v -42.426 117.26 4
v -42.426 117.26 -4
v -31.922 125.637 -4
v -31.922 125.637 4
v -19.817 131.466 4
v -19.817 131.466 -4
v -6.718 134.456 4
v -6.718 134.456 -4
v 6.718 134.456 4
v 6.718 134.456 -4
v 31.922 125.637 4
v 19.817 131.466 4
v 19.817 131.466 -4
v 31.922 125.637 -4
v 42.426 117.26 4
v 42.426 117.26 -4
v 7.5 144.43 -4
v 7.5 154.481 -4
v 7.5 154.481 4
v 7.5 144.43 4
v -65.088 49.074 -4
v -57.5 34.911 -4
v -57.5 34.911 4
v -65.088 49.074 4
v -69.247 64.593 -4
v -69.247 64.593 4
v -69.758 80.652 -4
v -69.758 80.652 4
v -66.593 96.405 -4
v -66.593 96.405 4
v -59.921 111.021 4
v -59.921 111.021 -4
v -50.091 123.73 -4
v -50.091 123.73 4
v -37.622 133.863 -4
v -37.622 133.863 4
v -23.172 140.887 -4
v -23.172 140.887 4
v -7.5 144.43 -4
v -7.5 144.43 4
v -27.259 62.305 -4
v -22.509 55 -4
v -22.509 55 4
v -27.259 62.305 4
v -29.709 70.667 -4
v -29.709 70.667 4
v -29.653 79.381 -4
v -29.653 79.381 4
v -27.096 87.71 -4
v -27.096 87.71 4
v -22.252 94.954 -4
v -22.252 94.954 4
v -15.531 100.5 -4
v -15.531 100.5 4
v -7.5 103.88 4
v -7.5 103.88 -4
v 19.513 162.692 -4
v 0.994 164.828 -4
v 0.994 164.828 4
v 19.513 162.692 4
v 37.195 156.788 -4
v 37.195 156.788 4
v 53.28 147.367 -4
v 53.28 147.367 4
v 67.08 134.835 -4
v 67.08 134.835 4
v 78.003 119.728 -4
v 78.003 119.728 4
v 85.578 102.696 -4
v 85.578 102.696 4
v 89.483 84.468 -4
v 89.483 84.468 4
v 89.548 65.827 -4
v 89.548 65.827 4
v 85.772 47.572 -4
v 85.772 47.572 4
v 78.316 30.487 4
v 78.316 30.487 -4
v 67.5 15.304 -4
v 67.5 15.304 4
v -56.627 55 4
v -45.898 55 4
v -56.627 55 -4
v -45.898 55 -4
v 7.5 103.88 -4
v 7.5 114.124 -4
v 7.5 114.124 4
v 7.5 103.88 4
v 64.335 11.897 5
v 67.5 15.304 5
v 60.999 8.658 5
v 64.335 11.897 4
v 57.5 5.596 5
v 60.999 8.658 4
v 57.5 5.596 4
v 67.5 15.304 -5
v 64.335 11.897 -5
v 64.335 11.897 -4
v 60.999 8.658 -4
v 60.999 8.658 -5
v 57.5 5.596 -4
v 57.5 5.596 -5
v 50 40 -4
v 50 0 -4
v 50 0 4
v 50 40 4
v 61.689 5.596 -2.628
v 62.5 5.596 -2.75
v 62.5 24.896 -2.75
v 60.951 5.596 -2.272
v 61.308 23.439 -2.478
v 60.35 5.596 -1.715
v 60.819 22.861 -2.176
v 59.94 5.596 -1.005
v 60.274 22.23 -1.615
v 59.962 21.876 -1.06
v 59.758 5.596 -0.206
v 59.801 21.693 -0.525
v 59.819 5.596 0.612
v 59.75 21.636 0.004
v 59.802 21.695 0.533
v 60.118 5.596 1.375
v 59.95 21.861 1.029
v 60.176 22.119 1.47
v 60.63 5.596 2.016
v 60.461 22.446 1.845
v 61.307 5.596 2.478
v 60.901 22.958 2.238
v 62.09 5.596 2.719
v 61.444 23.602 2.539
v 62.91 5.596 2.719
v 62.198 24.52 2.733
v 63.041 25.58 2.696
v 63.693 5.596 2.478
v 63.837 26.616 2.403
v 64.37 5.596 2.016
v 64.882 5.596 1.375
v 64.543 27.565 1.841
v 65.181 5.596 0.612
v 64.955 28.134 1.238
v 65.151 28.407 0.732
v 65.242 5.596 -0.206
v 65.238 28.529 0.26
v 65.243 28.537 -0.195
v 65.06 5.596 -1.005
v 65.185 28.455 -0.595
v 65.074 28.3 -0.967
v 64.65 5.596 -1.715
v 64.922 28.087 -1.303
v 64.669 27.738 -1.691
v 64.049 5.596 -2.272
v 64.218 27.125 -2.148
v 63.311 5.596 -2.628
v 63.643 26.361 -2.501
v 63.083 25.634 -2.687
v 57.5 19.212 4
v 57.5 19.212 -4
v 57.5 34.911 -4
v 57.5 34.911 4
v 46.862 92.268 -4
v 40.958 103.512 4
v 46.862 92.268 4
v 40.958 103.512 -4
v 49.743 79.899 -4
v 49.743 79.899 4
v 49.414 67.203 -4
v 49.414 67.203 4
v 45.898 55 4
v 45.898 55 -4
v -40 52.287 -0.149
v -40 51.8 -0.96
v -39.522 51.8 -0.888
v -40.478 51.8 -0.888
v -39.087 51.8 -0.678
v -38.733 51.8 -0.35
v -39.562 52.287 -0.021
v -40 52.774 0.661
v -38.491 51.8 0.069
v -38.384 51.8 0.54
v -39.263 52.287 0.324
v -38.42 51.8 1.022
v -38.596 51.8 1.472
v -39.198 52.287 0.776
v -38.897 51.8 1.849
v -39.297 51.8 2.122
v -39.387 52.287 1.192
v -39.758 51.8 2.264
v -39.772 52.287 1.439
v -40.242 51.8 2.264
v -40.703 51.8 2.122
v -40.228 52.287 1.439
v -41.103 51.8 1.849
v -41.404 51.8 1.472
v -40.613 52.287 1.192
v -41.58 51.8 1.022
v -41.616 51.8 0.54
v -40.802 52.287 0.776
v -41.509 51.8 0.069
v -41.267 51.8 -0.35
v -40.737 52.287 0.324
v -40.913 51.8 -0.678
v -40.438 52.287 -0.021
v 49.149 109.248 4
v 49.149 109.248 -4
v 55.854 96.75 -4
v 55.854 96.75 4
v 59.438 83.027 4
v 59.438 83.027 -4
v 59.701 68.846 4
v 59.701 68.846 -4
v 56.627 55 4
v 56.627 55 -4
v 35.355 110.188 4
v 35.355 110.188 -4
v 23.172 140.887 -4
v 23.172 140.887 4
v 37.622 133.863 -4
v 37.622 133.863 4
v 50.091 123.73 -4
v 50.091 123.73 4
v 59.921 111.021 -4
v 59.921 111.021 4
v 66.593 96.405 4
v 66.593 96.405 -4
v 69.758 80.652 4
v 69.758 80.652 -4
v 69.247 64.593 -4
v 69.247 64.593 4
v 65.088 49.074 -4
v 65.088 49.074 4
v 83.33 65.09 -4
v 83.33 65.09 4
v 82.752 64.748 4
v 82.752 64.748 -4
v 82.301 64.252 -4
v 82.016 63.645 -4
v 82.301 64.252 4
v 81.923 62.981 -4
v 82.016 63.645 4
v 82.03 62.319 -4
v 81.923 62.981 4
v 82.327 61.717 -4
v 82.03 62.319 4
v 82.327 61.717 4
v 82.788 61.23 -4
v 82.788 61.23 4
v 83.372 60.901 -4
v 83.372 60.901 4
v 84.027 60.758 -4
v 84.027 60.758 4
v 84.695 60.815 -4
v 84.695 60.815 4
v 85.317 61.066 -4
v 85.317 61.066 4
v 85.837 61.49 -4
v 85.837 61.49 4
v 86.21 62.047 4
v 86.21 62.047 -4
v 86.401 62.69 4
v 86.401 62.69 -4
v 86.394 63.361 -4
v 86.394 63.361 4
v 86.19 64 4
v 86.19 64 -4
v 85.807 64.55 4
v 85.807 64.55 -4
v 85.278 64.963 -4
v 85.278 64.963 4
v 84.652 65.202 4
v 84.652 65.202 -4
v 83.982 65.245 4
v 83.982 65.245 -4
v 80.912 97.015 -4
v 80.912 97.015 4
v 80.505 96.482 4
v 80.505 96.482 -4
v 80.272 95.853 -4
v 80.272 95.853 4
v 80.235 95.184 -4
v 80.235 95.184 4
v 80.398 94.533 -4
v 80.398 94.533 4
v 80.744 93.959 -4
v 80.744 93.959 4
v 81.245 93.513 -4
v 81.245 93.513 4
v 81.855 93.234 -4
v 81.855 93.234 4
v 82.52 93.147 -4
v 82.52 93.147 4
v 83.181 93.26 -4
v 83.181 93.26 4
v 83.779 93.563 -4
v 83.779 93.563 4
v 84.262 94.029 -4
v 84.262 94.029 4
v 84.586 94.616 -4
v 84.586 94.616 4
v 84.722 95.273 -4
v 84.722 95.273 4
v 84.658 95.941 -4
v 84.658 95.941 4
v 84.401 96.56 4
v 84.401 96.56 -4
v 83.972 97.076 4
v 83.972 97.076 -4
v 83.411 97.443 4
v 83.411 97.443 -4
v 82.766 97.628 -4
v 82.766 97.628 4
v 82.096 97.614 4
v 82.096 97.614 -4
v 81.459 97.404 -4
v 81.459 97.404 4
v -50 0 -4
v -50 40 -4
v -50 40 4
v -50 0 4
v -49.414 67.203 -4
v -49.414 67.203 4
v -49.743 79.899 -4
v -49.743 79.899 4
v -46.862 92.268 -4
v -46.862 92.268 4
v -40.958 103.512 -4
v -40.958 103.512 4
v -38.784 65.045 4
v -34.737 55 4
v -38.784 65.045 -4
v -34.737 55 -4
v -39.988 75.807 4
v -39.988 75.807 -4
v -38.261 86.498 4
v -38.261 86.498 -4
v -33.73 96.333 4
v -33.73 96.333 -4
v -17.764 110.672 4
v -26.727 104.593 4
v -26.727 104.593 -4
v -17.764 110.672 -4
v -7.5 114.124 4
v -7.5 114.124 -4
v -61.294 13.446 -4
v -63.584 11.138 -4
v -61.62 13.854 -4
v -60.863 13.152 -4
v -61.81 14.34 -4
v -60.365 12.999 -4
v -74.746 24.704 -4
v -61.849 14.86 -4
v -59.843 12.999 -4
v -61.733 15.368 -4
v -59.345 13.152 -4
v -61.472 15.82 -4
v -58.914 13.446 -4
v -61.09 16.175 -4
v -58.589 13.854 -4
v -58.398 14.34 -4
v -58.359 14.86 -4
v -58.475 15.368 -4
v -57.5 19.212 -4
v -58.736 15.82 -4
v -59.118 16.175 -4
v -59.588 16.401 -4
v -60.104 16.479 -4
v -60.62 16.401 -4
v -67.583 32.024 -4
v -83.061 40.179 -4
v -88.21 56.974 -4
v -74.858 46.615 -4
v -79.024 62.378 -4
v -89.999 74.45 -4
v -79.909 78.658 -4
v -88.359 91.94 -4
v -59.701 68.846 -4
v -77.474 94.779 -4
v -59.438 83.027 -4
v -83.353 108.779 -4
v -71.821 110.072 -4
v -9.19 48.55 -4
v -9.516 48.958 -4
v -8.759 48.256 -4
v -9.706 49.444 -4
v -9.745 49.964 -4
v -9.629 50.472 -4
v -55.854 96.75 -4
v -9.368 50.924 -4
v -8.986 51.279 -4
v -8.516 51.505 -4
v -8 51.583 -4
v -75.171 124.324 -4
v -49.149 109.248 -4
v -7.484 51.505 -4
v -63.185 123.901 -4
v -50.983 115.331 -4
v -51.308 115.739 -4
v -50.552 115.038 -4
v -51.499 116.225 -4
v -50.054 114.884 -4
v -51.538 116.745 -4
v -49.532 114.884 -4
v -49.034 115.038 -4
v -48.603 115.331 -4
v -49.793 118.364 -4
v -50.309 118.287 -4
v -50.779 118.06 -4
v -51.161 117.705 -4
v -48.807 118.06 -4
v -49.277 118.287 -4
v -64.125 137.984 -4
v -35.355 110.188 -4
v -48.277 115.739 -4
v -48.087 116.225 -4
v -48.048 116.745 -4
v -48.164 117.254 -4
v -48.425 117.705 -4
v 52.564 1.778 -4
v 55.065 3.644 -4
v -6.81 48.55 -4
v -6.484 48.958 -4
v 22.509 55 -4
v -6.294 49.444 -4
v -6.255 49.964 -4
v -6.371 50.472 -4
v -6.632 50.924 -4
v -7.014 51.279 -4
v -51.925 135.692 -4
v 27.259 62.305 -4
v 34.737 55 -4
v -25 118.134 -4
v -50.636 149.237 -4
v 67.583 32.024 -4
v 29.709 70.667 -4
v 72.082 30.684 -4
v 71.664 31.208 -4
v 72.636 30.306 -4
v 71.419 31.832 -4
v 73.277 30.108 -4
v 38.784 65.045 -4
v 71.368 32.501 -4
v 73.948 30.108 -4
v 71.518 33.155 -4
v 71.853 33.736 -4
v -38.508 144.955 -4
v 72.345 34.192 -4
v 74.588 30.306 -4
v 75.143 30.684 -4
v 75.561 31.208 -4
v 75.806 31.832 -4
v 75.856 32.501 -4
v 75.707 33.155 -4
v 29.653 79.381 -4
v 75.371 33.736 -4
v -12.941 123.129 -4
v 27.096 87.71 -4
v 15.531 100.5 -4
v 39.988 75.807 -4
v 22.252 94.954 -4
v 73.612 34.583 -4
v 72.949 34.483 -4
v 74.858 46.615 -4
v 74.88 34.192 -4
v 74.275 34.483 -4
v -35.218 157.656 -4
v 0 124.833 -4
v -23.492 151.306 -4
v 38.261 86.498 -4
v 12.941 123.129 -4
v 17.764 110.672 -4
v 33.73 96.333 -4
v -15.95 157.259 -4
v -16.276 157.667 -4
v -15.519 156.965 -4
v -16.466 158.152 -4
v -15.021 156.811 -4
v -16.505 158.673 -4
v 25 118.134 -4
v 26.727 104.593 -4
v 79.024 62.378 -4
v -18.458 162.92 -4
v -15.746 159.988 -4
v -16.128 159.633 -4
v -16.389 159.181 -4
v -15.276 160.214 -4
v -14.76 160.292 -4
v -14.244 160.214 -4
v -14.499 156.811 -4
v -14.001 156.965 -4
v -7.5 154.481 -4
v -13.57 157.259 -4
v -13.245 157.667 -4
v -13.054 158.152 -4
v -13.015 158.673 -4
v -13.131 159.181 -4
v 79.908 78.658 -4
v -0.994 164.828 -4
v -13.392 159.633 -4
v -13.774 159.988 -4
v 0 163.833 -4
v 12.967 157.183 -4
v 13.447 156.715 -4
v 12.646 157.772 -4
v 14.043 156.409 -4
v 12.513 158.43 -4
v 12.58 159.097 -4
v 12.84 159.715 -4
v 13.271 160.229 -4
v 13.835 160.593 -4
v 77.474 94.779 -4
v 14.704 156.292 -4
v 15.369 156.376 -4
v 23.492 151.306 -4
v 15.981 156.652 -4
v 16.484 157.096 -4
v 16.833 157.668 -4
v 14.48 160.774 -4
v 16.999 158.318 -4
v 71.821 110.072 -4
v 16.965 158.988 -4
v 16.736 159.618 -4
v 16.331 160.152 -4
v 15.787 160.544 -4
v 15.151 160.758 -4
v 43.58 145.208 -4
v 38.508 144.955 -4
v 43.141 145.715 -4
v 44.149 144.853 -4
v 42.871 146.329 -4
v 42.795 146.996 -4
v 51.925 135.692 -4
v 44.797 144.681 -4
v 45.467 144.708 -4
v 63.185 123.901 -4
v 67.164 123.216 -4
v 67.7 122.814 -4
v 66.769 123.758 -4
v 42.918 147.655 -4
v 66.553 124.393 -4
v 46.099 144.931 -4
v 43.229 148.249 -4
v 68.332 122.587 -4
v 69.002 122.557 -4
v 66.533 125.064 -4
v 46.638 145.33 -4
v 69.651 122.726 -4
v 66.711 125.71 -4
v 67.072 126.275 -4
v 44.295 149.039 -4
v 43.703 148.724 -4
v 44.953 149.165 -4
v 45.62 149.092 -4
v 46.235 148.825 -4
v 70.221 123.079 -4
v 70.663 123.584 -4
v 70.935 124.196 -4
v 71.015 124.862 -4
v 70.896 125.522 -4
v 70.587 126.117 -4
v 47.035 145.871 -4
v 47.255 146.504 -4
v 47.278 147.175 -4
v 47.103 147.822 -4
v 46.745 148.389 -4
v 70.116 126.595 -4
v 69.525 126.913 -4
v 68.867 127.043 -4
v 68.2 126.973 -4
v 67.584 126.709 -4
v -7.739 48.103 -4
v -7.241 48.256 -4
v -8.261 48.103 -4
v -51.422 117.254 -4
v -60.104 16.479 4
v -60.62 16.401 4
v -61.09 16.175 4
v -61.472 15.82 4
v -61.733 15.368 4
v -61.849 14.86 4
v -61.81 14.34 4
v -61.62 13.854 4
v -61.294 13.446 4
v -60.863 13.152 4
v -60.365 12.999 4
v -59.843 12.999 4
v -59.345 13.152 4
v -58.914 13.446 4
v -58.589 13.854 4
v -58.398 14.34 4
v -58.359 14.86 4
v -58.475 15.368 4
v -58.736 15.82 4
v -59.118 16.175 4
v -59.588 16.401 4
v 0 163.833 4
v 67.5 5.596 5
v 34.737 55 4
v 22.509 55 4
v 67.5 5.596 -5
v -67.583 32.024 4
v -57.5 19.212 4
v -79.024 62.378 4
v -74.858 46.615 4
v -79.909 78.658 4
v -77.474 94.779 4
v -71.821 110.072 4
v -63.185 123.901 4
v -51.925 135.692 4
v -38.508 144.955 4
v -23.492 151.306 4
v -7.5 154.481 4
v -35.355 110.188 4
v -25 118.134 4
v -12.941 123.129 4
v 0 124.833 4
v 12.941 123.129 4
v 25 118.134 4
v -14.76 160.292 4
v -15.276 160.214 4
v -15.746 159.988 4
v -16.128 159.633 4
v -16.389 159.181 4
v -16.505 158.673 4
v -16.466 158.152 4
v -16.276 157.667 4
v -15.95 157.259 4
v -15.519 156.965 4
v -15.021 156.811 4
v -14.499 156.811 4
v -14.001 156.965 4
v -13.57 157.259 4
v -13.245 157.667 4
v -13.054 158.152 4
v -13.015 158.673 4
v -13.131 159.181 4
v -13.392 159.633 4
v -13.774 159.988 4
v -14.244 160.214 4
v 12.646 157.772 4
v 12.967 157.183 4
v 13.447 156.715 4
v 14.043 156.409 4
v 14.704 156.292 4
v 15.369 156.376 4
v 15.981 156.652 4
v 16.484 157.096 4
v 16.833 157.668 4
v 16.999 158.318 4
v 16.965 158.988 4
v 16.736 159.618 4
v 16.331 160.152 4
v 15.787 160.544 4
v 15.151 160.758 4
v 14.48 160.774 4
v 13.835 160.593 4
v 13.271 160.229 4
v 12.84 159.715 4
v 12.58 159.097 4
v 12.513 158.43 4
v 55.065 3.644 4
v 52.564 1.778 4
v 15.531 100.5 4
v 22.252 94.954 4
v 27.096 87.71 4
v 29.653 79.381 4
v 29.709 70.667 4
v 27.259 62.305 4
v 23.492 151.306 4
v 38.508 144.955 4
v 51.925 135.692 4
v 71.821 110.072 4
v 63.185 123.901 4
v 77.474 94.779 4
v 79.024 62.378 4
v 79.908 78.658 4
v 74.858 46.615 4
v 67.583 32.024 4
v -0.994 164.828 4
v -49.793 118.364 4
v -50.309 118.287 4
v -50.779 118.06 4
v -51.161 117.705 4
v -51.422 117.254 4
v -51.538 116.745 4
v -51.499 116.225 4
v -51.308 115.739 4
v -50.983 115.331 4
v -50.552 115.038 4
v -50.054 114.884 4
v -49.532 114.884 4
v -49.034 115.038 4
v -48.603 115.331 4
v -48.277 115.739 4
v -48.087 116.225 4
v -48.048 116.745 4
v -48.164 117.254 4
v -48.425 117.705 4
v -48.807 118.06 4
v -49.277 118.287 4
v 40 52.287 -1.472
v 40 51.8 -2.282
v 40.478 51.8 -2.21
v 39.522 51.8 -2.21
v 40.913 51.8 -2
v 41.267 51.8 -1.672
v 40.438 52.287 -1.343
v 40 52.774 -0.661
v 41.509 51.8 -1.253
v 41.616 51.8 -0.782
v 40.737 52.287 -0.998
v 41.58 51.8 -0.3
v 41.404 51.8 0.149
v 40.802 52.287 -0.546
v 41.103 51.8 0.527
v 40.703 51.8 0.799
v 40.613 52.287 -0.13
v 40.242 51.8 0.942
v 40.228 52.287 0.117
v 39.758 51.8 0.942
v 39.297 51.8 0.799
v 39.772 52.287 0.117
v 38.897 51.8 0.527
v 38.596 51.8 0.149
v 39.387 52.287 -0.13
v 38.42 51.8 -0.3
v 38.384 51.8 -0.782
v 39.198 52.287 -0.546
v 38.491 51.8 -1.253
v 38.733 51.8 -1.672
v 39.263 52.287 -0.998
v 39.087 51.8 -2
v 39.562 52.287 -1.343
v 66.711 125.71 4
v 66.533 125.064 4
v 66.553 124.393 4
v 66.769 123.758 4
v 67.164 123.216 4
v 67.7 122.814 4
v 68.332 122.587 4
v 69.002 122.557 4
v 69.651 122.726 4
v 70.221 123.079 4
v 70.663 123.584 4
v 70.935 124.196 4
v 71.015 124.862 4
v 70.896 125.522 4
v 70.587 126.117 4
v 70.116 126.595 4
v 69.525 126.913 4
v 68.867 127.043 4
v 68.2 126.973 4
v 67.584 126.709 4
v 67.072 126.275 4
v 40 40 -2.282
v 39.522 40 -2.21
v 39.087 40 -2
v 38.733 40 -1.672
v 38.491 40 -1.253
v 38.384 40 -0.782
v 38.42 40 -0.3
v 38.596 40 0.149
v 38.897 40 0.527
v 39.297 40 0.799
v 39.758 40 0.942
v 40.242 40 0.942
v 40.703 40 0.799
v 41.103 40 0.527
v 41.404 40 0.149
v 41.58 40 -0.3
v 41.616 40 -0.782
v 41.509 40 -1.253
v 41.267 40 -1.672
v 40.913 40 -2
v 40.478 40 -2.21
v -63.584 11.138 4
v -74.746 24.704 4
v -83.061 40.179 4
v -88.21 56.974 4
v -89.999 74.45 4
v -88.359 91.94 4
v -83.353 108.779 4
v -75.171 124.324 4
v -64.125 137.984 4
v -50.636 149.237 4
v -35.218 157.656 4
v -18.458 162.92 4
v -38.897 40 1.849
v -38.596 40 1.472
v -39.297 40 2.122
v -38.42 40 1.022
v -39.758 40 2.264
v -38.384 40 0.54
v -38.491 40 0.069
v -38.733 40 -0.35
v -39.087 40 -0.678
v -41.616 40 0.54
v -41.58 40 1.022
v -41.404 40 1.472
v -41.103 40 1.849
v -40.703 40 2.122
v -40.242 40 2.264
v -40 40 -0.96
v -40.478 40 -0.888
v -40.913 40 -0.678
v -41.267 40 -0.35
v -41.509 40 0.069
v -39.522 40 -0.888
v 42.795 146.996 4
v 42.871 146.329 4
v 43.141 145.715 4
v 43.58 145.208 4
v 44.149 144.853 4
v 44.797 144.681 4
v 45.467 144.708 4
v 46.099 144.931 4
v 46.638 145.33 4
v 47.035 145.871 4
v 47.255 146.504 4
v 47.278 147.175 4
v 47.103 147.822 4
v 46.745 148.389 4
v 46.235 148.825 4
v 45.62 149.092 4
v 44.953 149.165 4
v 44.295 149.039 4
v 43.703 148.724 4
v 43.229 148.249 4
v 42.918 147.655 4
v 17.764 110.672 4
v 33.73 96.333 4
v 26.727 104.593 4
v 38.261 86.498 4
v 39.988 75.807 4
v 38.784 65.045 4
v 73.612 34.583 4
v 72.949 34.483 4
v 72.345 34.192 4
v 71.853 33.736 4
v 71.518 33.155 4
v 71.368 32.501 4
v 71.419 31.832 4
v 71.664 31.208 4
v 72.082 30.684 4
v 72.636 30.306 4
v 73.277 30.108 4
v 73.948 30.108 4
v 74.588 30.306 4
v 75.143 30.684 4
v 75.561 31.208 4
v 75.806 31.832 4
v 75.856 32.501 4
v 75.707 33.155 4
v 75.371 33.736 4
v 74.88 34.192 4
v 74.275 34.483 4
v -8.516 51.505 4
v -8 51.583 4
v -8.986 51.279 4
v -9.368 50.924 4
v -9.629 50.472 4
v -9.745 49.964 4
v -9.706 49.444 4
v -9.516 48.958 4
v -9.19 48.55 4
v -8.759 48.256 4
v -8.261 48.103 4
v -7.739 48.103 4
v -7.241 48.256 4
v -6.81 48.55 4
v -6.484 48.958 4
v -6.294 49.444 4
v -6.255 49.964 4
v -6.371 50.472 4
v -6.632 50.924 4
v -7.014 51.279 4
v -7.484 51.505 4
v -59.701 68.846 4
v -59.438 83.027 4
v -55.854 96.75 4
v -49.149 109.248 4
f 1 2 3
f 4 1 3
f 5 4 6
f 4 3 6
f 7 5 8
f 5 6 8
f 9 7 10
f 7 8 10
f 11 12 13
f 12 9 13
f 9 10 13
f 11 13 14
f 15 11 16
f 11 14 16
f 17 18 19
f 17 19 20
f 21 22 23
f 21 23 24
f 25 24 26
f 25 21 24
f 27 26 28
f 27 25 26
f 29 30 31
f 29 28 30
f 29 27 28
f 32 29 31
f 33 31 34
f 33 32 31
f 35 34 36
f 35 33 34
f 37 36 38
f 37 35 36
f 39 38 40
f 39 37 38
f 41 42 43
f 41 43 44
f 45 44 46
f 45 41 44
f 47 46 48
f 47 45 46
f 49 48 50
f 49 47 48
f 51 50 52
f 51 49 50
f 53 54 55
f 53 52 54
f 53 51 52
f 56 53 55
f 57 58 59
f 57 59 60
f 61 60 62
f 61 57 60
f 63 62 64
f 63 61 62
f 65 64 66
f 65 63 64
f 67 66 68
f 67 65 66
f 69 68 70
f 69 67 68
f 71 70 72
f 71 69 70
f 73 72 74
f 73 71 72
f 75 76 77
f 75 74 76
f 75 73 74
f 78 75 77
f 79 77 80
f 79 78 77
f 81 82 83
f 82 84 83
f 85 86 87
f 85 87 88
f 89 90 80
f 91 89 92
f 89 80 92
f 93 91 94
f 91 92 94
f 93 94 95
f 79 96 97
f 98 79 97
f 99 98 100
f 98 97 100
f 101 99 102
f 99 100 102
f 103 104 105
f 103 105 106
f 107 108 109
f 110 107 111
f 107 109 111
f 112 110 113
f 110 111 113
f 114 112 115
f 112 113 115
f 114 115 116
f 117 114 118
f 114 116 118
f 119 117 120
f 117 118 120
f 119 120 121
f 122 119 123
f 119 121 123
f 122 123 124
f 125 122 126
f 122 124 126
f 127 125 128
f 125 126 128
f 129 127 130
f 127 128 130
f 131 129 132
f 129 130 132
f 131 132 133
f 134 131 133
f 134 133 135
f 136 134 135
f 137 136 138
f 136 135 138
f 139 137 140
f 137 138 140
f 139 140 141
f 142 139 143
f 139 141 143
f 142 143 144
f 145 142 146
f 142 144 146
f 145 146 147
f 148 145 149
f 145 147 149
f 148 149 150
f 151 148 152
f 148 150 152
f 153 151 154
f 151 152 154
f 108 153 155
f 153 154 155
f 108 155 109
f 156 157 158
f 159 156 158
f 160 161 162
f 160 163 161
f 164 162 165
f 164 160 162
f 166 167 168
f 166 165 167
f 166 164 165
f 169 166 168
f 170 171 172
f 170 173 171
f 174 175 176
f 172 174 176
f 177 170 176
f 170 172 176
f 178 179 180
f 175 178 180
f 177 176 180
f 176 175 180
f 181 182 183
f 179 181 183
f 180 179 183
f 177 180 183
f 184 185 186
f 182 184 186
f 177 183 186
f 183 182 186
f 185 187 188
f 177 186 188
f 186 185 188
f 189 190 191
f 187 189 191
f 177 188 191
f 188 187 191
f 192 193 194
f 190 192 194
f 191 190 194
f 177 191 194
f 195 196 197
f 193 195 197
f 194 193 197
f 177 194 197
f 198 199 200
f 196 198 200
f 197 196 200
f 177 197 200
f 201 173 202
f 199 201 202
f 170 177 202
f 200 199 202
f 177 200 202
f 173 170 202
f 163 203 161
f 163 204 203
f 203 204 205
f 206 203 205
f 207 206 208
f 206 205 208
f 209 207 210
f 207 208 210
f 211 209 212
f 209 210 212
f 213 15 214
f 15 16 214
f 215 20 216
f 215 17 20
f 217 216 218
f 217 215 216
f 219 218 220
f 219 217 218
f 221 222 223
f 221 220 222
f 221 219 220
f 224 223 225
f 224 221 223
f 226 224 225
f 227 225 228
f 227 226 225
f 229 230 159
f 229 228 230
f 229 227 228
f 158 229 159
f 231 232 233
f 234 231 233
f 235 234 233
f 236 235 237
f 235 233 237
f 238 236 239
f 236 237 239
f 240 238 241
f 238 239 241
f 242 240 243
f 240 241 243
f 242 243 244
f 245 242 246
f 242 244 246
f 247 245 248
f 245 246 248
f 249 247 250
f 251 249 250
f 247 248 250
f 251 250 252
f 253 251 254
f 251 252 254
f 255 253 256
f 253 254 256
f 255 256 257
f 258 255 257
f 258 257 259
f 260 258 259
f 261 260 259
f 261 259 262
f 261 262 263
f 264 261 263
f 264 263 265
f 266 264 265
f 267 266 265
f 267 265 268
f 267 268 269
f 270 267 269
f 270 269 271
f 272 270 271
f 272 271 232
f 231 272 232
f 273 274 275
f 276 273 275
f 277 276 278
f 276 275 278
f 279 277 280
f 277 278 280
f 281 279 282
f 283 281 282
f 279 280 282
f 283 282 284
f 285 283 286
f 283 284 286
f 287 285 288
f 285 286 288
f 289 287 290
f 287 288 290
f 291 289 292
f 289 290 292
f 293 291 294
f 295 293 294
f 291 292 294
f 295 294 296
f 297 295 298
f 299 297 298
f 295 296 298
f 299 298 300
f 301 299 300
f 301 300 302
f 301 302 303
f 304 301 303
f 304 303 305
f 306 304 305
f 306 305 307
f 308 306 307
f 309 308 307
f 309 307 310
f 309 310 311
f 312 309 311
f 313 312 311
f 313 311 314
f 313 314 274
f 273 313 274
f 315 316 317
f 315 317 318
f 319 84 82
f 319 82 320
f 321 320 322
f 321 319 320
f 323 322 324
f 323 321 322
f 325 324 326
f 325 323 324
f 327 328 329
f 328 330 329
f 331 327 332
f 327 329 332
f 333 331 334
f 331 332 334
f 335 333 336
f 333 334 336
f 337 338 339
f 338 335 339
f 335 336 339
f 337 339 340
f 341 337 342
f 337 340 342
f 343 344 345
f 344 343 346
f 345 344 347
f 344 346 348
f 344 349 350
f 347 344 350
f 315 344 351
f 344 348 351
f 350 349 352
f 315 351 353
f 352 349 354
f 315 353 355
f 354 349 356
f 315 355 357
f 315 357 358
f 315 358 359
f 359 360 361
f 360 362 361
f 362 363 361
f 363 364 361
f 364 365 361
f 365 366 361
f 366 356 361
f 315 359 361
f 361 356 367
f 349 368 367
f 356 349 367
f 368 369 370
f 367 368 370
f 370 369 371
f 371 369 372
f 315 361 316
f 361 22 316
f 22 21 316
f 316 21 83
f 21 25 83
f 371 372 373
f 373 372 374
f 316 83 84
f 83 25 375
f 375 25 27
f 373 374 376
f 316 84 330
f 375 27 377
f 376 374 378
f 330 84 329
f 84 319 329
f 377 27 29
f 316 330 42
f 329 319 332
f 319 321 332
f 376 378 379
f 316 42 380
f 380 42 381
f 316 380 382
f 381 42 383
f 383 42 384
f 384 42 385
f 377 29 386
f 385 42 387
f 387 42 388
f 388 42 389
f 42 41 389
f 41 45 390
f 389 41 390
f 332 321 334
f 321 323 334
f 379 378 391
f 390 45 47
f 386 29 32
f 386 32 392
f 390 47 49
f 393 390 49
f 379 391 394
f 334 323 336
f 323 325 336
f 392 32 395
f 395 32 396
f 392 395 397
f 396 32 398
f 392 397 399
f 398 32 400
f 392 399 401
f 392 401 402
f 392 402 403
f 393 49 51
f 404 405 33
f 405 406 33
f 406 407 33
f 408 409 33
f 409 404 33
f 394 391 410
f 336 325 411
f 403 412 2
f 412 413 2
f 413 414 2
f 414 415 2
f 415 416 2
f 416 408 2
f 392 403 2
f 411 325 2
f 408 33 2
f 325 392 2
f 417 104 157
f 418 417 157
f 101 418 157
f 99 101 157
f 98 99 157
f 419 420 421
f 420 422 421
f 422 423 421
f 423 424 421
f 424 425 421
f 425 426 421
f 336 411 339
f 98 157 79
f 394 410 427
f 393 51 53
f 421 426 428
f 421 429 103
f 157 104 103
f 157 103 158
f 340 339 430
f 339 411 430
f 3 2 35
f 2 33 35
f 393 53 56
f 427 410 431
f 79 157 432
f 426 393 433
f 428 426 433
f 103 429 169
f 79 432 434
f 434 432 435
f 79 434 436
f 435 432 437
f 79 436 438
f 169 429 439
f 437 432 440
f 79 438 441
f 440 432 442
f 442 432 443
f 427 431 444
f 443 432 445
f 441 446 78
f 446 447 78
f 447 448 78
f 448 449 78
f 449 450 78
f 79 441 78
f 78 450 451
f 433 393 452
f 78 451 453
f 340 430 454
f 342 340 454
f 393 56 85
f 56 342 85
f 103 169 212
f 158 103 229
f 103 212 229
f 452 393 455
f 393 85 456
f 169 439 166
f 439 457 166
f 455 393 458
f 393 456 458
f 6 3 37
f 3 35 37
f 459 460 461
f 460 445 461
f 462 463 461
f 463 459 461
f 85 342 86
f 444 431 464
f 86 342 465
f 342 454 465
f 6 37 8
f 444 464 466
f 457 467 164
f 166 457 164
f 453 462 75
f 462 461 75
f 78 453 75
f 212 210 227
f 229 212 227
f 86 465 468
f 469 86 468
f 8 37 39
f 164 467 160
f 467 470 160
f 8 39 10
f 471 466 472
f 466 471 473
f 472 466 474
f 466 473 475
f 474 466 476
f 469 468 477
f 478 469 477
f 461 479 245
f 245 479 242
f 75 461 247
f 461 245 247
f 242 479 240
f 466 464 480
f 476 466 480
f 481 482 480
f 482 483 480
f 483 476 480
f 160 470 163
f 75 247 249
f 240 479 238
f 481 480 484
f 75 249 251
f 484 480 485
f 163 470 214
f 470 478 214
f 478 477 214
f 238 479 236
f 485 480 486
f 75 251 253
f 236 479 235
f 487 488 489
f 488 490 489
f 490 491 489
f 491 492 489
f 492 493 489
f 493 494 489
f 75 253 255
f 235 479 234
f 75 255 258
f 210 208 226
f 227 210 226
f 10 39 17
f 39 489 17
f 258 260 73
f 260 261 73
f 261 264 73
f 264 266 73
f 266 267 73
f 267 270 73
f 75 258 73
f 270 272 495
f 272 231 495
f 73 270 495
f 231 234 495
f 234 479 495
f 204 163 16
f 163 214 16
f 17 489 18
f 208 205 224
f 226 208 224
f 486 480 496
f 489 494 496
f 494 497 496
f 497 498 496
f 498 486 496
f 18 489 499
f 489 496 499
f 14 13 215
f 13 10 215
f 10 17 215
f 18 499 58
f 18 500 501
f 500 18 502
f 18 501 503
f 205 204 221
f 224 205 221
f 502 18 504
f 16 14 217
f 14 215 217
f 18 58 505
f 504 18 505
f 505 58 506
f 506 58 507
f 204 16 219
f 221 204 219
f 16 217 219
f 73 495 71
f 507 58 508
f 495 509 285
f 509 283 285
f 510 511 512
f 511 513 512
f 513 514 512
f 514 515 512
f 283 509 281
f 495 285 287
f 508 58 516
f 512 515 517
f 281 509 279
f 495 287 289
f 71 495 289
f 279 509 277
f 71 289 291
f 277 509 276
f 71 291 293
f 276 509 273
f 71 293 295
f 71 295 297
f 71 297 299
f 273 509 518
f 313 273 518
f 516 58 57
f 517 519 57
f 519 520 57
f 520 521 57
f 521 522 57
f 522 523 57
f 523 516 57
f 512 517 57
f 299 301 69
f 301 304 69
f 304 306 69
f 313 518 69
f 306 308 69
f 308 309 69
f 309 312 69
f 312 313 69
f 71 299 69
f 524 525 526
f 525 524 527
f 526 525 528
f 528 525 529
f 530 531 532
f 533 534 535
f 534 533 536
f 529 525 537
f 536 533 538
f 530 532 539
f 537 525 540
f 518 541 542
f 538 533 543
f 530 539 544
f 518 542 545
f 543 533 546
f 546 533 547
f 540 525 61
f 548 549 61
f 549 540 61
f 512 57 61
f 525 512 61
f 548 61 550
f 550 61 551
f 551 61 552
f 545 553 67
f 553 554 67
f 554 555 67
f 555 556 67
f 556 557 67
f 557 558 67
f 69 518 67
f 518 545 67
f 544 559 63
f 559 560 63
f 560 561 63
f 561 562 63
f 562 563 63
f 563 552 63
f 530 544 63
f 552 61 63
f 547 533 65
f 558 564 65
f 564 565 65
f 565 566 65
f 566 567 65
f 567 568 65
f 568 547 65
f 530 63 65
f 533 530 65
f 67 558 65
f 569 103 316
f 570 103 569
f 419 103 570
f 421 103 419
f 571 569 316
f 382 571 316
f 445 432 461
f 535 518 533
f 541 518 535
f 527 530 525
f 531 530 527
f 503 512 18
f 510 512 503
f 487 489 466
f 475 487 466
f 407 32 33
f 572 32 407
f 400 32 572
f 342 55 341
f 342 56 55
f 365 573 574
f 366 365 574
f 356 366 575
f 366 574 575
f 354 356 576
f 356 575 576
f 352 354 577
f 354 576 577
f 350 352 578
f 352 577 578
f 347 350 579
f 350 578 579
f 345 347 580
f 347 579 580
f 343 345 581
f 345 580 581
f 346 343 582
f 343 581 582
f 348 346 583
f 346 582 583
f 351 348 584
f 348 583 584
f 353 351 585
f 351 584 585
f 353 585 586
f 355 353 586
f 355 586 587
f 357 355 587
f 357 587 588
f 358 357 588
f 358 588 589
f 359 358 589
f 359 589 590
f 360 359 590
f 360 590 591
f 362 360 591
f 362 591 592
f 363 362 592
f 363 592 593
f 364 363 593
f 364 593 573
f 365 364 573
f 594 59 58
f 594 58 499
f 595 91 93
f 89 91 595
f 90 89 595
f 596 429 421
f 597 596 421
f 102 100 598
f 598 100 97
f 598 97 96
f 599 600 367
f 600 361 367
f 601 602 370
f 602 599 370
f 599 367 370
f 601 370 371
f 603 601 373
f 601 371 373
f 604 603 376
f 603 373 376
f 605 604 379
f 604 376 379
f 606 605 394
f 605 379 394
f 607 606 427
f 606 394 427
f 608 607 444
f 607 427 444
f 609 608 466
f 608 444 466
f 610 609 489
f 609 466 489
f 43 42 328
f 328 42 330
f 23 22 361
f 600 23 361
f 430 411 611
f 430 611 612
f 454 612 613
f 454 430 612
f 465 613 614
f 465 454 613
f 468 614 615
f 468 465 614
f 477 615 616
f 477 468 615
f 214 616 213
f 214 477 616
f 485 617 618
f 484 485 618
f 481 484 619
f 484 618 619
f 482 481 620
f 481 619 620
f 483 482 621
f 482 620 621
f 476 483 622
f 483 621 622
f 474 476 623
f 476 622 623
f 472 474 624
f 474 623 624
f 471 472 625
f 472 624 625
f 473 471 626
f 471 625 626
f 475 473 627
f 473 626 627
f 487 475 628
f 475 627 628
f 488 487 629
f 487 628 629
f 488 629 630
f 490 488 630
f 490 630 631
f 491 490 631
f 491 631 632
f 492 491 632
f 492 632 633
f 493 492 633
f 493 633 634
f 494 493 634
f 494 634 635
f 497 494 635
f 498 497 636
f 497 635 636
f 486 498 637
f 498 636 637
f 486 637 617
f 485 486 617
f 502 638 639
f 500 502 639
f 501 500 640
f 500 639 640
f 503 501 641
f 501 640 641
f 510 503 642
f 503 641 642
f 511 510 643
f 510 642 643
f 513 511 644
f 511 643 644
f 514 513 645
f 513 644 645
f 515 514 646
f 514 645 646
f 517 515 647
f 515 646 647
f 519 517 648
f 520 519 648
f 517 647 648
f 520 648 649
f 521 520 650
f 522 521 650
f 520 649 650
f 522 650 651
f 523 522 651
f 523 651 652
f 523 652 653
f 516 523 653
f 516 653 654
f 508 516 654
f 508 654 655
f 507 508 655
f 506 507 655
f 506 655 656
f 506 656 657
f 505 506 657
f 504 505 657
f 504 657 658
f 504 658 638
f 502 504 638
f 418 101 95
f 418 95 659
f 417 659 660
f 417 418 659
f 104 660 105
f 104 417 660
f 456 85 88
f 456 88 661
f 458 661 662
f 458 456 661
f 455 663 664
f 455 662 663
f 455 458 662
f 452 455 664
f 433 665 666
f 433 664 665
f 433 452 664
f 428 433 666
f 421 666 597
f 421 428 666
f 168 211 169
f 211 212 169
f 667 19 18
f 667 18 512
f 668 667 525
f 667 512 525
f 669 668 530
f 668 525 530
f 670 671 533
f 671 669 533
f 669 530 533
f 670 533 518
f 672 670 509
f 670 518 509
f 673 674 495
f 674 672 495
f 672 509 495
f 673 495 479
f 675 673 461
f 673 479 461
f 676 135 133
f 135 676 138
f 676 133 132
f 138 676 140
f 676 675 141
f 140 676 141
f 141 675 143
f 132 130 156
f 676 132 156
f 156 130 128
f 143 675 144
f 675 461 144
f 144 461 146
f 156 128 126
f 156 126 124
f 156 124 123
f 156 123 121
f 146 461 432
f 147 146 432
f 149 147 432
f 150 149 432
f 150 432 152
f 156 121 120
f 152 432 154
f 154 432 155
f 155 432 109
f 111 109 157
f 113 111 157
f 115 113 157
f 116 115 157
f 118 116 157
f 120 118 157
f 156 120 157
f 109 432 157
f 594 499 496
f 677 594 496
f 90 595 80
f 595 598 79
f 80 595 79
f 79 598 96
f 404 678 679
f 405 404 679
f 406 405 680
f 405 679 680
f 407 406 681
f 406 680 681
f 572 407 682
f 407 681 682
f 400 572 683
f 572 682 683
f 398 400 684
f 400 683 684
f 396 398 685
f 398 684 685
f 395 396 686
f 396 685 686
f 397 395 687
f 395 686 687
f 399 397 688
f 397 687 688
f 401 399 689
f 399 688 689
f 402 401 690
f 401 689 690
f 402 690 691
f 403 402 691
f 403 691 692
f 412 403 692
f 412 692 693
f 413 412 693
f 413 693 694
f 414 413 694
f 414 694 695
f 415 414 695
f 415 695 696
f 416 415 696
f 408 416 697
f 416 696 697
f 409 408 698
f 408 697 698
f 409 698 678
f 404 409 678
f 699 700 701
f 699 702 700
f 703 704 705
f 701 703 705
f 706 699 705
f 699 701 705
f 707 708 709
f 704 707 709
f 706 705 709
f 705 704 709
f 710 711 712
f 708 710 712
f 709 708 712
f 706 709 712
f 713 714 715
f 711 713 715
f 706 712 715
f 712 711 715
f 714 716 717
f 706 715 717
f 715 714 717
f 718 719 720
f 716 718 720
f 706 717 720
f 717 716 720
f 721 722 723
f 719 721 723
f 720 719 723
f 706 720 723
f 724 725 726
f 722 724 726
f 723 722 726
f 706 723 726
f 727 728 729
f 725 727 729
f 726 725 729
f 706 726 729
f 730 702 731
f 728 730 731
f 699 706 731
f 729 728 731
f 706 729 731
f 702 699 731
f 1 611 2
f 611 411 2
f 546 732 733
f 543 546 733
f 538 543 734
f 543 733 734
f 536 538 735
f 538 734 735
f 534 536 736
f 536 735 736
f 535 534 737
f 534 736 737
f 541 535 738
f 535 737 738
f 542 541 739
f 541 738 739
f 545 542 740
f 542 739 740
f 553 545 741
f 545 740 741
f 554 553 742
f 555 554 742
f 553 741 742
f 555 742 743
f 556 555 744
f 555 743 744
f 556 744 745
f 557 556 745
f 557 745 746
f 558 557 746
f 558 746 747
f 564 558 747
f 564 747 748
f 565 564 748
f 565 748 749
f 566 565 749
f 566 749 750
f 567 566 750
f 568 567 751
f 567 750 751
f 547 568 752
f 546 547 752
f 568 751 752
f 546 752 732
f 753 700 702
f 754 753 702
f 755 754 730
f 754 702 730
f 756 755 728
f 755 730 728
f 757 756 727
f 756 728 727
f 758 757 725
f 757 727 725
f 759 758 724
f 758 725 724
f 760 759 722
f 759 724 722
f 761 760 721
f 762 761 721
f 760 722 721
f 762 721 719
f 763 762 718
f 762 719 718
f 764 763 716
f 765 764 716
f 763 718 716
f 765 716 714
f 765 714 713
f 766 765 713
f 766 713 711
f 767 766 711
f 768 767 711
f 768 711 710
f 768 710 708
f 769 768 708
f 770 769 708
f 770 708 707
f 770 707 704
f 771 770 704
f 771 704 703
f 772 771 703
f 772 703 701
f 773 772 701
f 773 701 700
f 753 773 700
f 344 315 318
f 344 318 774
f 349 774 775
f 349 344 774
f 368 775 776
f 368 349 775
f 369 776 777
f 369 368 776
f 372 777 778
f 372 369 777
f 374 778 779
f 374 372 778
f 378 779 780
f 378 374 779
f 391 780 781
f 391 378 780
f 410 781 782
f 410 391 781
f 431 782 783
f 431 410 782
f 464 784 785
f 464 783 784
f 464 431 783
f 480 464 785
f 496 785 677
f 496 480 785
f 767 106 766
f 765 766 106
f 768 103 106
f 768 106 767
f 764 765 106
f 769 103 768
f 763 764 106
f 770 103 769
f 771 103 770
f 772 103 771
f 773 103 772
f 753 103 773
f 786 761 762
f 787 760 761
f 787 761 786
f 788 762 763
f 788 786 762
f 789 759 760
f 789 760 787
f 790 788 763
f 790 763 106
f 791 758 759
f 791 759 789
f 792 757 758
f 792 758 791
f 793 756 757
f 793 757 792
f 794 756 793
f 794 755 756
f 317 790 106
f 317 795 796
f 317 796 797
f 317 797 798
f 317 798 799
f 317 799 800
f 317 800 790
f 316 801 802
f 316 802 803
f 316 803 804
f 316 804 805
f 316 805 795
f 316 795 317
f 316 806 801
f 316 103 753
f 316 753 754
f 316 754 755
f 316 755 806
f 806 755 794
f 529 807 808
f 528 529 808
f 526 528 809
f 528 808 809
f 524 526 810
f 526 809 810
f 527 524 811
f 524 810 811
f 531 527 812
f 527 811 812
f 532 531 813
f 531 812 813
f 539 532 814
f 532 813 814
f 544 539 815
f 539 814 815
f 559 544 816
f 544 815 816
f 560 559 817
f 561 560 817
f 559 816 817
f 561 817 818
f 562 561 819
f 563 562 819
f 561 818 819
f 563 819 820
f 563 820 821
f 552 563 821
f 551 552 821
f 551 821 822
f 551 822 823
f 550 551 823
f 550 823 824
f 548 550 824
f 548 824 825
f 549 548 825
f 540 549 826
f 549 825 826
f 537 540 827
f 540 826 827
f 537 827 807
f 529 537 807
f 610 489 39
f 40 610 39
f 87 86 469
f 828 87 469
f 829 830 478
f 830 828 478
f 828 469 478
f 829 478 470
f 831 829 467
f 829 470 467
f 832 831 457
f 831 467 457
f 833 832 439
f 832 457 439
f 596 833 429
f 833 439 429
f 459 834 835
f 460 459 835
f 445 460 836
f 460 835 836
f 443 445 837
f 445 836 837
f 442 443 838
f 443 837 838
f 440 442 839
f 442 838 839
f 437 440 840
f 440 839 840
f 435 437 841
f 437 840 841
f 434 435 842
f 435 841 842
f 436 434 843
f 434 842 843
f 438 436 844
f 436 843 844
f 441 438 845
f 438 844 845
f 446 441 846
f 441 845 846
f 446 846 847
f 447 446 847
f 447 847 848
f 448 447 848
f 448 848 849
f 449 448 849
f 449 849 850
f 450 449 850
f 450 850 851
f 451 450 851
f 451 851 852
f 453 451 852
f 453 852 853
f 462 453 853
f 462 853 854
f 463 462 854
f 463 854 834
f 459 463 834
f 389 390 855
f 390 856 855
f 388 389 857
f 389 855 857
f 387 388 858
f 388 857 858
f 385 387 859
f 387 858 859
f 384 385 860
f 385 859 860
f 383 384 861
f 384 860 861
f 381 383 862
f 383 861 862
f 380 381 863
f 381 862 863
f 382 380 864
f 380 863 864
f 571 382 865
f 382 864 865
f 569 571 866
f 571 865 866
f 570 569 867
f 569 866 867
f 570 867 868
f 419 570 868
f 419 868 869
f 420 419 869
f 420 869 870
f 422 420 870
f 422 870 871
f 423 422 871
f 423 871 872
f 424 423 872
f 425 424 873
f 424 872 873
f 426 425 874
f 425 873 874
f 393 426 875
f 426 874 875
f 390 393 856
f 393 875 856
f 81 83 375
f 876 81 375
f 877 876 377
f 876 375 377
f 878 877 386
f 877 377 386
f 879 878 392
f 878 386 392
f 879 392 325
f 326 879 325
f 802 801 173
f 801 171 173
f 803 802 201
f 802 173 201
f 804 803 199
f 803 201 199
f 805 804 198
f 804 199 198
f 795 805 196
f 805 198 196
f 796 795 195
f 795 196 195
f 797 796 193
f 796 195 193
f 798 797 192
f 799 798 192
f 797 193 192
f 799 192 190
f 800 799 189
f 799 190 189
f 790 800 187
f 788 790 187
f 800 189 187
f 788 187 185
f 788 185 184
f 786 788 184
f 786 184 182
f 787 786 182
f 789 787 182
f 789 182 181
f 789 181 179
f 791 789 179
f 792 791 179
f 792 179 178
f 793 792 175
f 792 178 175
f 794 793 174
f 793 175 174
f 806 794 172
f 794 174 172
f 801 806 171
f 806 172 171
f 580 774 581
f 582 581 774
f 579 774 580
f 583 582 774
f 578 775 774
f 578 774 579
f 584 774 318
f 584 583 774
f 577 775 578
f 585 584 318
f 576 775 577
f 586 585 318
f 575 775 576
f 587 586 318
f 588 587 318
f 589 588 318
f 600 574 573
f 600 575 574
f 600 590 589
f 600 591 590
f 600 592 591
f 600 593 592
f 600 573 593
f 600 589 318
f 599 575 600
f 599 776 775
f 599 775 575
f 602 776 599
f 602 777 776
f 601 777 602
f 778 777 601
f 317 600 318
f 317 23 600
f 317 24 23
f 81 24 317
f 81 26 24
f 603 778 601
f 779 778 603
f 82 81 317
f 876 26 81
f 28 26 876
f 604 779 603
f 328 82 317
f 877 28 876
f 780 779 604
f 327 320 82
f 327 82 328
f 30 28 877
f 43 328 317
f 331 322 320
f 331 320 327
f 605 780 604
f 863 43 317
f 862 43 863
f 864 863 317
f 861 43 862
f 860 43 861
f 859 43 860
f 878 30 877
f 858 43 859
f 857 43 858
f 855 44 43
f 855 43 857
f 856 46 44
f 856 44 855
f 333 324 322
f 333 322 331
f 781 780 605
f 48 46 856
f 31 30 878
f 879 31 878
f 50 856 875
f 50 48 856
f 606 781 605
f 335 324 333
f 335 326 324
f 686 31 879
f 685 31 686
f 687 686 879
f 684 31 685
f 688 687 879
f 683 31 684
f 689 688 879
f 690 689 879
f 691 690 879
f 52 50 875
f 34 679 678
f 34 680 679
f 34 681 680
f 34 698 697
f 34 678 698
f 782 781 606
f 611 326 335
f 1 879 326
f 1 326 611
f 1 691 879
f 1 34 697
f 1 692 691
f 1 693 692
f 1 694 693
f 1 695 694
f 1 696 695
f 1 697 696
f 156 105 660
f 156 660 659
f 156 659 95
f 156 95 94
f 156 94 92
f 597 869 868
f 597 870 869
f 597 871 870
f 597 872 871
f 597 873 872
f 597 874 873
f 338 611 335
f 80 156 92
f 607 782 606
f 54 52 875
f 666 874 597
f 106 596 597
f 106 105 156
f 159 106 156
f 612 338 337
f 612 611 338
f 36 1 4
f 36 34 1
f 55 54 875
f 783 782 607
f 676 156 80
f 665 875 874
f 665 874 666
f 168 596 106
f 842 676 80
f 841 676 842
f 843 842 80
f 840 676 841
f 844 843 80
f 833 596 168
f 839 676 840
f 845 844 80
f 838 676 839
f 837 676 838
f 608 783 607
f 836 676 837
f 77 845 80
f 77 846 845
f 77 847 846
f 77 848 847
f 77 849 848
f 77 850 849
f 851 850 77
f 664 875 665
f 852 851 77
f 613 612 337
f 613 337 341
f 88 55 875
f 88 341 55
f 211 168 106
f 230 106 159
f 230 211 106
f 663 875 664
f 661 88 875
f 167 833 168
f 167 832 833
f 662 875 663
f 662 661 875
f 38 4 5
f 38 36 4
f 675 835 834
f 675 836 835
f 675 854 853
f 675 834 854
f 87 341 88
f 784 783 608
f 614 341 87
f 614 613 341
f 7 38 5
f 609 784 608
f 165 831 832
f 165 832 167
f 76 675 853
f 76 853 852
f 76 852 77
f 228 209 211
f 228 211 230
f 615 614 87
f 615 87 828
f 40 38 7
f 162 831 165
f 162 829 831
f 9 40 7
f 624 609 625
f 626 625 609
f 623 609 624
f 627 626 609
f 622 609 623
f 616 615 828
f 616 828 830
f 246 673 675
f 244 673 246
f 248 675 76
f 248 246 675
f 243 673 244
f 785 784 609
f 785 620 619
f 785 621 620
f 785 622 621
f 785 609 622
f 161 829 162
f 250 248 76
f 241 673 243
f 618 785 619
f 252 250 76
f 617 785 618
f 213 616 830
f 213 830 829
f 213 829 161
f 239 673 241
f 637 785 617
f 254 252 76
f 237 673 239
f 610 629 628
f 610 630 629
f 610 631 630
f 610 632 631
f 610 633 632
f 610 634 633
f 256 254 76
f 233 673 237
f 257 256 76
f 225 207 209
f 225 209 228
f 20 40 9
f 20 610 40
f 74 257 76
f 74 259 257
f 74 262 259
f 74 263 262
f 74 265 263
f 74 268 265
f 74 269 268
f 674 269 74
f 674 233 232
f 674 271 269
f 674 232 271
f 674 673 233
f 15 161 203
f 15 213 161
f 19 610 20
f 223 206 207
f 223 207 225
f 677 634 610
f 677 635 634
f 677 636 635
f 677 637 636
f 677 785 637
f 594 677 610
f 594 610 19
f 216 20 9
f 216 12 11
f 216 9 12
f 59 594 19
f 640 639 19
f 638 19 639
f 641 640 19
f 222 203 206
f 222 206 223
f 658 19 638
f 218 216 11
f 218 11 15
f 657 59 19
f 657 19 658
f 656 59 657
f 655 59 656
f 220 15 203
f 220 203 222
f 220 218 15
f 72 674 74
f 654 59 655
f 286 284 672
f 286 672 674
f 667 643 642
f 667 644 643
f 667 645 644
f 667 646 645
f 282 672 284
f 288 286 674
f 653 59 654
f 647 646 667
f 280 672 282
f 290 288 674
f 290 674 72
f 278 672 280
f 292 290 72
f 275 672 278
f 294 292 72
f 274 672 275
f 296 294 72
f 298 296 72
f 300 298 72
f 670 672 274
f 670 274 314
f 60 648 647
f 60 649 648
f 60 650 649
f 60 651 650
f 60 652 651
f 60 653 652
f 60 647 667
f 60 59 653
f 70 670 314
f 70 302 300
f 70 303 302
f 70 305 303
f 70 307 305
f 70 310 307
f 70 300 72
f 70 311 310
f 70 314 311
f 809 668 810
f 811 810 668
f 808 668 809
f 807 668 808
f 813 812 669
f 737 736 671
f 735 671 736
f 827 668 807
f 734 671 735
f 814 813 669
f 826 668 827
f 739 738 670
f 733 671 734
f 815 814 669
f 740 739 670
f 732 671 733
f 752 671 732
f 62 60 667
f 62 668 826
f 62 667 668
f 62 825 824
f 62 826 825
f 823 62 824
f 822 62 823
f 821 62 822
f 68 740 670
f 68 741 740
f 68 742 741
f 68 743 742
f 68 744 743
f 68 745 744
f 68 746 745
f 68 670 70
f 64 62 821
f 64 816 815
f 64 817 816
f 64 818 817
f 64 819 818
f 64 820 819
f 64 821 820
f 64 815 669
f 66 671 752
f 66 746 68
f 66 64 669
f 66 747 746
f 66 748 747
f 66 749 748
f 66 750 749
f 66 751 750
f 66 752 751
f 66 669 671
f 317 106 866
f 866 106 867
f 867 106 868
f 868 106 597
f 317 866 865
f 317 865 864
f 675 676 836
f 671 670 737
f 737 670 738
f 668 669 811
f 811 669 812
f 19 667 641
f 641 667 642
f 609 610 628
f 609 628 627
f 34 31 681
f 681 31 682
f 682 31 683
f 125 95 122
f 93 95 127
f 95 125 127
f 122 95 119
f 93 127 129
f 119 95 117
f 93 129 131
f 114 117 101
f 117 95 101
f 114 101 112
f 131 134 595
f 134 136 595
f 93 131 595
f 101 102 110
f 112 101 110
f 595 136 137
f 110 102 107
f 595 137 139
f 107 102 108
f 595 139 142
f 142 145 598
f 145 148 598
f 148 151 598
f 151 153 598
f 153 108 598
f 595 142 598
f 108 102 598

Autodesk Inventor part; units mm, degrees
ref_plane "YZ Plane" through (0, 0, 0) normal (1, 0, 0) x (0, 1, 0)
ref_plane "XZ Plane" through (0, 0, 0) normal (0, 1, 0) x (-1, 0, 0)
ref_plane "XY Plane" through (0, 0, 0) normal (0, 0, 1) x (1, 0, 0)
sketch "Sketch2" plane through (0, 0, 0) normal (0, 0, 1) x (1, 0, 0)
  line L0 (-50, 0) -> (50, 0) construction
  line L1 (50, 0) -> (50, 40)
  line L2 (50, 40) -> (-50, 40)
  line L3 (-50, 40) -> (-50, 0)
  arc A0 (50, 0) -> (-50, 0) centre (0, 74.8331) ccw
  line L4 (57.5, 19.2117) -> (57.5, 34.9113)
  line L5 (-57.5, 34.9113) -> (-57.5, 19.2117)
  line L6 (7.5, 154.4808) -> (7.5, 144.4302)
  line L7 (-7.5, 154.4808) -> (-7.5, 144.4302)
  line L8 (7.5, 144.4302) -> (-7.5, 154.4808) construction
  arc A1 (57.5, 34.9113) -> (7.5, 144.4302) centre (0, 74.8331) ccw
  arc A2 (-7.5, 144.4302) -> (-57.5, 34.9113) centre (0, 74.8331) ccw
  arc A3 (57.5, 19.2117) -> (7.5, 154.4808) centre (0, 74.8331) ccw
  arc A4 (-7.5, 154.4808) -> (-57.5, 19.2117) centre (0, 74.8331) ccw
  line L9 (56.6273, 55) -> (45.8982, 55)
  line L10 (-45.8982, 55) -> (-56.6273, 55)
  line L11 (42.4264, 117.2596) -> (35.3553, 110.1885)
  line L12 (-35.3553, 110.1885) -> (-42.4264, 117.2596)
  line L13 (49.1491, 109.2477) -> (40.9576, 103.512)
  line L14 (-49.1491, 109.2477) -> (-40.9576, 103.512)
  arc A5 (-40.9576, 103.512) -> (-45.8982, 55) centre (0, 74.8331) ccw
  arc A6 (-49.1491, 109.2477) -> (-56.6273, 55) centre (0, 74.8331) ccw
  arc A7 (45.8982, 55) -> (40.9576, 103.512) centre (0, 74.8331) ccw
  arc A8 (35.3553, 110.1885) -> (-35.3553, 110.1885) centre (0, 74.8331) ccw
  arc A9 (56.6273, 55) -> (49.1491, 109.2477) centre (0, 74.8331) ccw
  arc A10 (42.4264, 117.2596) -> (-42.4264, 117.2596) centre (0, 74.8331) ccw
  line L15 (7.5, 114.1237) -> (7.5, 103.8805)
  line L16 (-7.5, 103.8805) -> (-7.5, 114.1237)
  line L17 (34.7368, 55) -> (22.5088, 55)
  line L18 (-22.5088, 55) -> (-34.7368, 55)
  arc A11 (-7.5, 103.8805) -> (-22.5088, 55) centre (0, 74.8331) ccw
  arc A12 (22.5088, 55) -> (7.5, 103.8805) centre (0, 74.8331) ccw
  arc A13 (-7.5, 114.1237) -> (-34.7368, 55) centre (0, 74.8331) ccw
  arc A14 (34.7368, 55) -> (7.5, 114.1237) centre (0, 74.8331) ccw
  point P0 (0, 0)
  point P1 (0, 0)
  point P2 (0, 149.4555)
  dimension "d11" = 100
  dimension "d12" = 40
  dimension "d27" = 90
  dimension "d29" = 7.5
  dimension "d30" = 7.5
  dimension "d34" = 10
  dimension "d35" = 10
  dimension "d36" = 10
  dimension "d37" = 10
  dimension "d38" = 15
  dimension "d71" = 15
  dimension "d74" = 10
  dimension "d75" = 10
  dimension "d76" = 45
  dimension "d77" = 45
  dimension "d78" = 10
  dimension "d79" = 10
  dimension "d80" = 10
  dimension "d81" = 10
extrude "Extrusion2" add sketch "Sketch2" along normal mid plane 8
sketch "Sketch6" plane through (0, 0, 0) normal (0, 0, 1) x (1, 0, 0)
  arc A0 (50, 0) -> (-50, 0) centre (0, 74.8331) ccw projected
  line L0 (57.5, 5.5962) -> (67.5, 5.5962)
  line L1 (67.5, 5.5962) -> (67.5, 15.3037)
  point P0 (0, 0)
  point P1 (57.5, 19.2117)
  dimension "d48" = 10
extrude "Extrusion4" add sketch "Sketch6" along normal mid plane 10
sketch "Sketch8" plane through (0, 0, 0) normal (0, 0, 1) x (1, 0, 0)
  arc A0 (50, 0) -> (-50, 0) centre (0, 74.8331) ccw construction
  line L0 (2, 165.8331) -> (0, 163.8331)
  line L1 (0, 163.8331) -> (-2, 165.8331)
  line L2 (-2, 165.8331) -> (2, 165.8331)
  line L3 (0, 165.8331) -> (0, 164.8331) construction
  point P0 (0, 0)
  point P1 (67.5, 15.3037)
  dimension "d67" = 1
  dimension "d68" = 2
extrude "Extrusion5" cut sketch "Sketch8" along normal mid plane 10
sketch "Sketch7" plane through (57.5, 5.5962, 5) normal (0, -1, 0) x (1, 0, 0)
  line L0 (10, 0) -> (10, -10) projected
  line L1 (0, 0) -> (10, 0) projected
  line L2 (10, -10) -> (0, -10) projected
  line L3 (0, 0) -> (10, -10)
  line L4 (0, -9) -> (0, -1) projected
  line L5 (0, -1) -> (0, 0) projected
  line L6 (0, -10) -> (0, -9) projected
  point P0 (-57.5, -5)
  point P1 (5, -5)
hole "Hole2" at (62.5, 5.5962, 0) direction (0, 1, 0) diameter 5.5 depth 25 tip angle 118
sketch "Sketch9" plane through (0, 0, -4) normal (0, 0, -1) x (-1, 0, 0)
  arc A0 (-0.9945, 164.8277) -> (-67.5, 15.3037) centre (0, 74.8331) ccw construction
  line L0 (-73.6122, 32.3331) -> (0, 74.8331) construction
  line L1 (0, 74.8331) -> (0, 98.0248) construction
  point P0 (0, 0)
  dimension "d82" = 85
  dimension "d83" = 120
hole "Hole3" at (73.6122, 32.3331, -4) direction (0, 0, 1) diameter 4.5 depth 10 tip angle 118
pattern_circular "Circular Pattern2" count 6 over 110 about axis through (0, 74.8331, 0) along (0, 0, 1) of "Hole3"
sketch "Sketch10" plane through (-50, 40, 4) normal (0, -1, 0) x (1, 0, 0)
  line L0 (90, -4.6611) -> (50, -4) construction
  line L1 (50, -4) -> (10, -3.3389) construction
  dimension "d94" = 80
hole "Hole4" at (-40, 40, 0.6611) at (40, 40, -0.6611) direction (0, 1, 0) diameter 3.242 depth 11.8 tip angle 118 thread size "M4x0.7" class "6H" standard "ISO Metric profile"
sketch "Sketch11" plane through (0, 0, -4) normal (0, 0, -1) x (-1, 0, 0)
  point P0 (0, 0)
sketch "Sketch12" plane through (0, 0, -4) normal (0, 0, -1) x (-1, 0, 0)
  arc A0 (22.5088, 55) -> (7.5, 103.8805) centre (0, 74.8331) ccw construction
  line L0 (0, 74.8331) -> (12.608, 74.8331) construction
  point P0 (0, 0)
  point P1 (14.7601, 158.5418)
  point P2 (60.1041, 14.7291)
  point P3 (49.7929, 116.6143)
  point P4 (8, 49.8331)
  dimension "d102" = 85
  dimension "d103" = 65
  dimension "d104" = 85
  dimension "d105" = 80
  dimension "d106" = 40
  dimension "d107" = 45
  dimension "d108" = 25
  dimension "d109" = 8
hole "Hole5" at (-14.7601, 158.5418, -4) at (-49.7929, 116.6143, -4) at (-8, 49.8331, -4) at (-60.1041, 14.7291, -4) direction (0, 0, 1) diameter 3.5 depth 11.8 tip angle 118
equation "\"d36\" = d35"
equation "\"d37\" = d34"
properties part number "M02_R01 - Main Spherical Shaft" material "Glass"
